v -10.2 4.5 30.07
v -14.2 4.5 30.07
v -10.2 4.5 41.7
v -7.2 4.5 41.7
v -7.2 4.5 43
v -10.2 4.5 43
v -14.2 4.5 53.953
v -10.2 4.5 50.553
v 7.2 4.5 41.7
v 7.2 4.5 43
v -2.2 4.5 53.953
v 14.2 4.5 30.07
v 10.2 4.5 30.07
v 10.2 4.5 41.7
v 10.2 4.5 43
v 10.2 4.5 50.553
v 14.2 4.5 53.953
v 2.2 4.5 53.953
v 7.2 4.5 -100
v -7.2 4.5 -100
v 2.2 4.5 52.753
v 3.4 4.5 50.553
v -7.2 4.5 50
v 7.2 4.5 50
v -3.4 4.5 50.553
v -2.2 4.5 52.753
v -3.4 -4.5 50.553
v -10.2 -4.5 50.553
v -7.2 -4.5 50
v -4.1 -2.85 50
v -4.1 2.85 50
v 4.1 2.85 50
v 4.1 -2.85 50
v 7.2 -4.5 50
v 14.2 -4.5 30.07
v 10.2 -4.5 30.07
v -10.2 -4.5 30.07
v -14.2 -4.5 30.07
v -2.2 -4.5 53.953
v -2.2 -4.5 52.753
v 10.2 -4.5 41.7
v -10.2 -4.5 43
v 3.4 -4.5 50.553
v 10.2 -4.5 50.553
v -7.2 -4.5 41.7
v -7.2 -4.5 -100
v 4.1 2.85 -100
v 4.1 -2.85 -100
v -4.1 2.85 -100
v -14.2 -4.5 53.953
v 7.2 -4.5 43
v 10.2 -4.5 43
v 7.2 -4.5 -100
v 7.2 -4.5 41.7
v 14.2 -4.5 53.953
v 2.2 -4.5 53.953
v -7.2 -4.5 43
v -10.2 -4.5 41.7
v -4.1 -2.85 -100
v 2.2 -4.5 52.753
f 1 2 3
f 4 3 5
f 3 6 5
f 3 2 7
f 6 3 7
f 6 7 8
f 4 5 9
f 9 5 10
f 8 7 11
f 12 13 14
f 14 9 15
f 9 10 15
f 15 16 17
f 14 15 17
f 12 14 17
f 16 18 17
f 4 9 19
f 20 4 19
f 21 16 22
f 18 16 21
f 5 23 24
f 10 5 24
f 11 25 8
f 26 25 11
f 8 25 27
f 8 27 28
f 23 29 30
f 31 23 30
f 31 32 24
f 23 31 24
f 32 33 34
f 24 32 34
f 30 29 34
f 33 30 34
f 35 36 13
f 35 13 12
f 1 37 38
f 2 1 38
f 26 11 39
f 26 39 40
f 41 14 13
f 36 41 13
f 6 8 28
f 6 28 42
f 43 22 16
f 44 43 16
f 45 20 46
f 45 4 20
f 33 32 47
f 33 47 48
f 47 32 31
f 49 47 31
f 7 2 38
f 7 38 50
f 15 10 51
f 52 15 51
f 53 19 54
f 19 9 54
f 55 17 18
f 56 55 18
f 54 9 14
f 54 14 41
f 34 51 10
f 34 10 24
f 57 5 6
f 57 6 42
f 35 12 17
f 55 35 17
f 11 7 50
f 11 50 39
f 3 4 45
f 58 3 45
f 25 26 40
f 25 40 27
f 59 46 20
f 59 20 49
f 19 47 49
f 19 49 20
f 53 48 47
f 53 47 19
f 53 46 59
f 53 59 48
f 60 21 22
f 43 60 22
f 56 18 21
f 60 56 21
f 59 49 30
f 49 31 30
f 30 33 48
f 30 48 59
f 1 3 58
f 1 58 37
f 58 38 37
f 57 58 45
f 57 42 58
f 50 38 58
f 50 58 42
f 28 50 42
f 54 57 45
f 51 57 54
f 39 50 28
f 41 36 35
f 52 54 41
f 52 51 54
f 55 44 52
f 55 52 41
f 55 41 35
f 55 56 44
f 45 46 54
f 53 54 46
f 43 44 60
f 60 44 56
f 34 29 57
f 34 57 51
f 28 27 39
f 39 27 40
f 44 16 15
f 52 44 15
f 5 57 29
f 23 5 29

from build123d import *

# Parameters (mm, degrees)
F0_W     = 14.4
F0_H     = 100
F1_DEPTH = 4.5
F2_W     = 8.2
F2_H     = 5.7
F3_DEPTH = 100.001
F4_W     = 9
F4_H     = 1.3
F5_DEPTH = 6
F7_DEPTH = 9
F9_DEPTH = 50


with BuildPart() as f1:
    # F0 (on Front) → F1 (new body, symmetric)
    with BuildSketch(Plane.XZ):
        Rectangle(F0_W, F0_H)
    extrude(amount=F1_DEPTH, both=True)

    # F2 (on face) → F3 (cut, through all)
    with BuildSketch(Plane.XY.offset(50)):
        Rectangle(F2_W, F2_H)
    extrude(amount=-F3_DEPTH, mode=Mode.SUBTRACT)

    # F4 (on face) → F5 (join)
    with BuildSketch(Plane(origin=(-7.2, 0, 0), x_dir=(0, -1, 0), z_dir=(-1, 0, 0))):
        with Locations((0, 42.35)):
            Rectangle(F4_W, F4_H)
    extrude(amount=F5_DEPTH)

    # F6 (on face) → F7 (join)
    with BuildSketch(Plane(origin=(0, 4.5, 0), x_dir=(-1, 0, 0), z_dir=(0, 1, 0))):
        Polygon((10.2, 50.5525747299), (10.2, 30.0701190412), (14.2, 30.0701190412), (14.2, 53.9525747299), (10.2, 53.9525747299), align=None)
        Polygon((3.4, 50.5525747299), (10.2, 50.5525747299), (10.2, 53.9525747299), (3.4, 53.9525747299), (2.2, 53.9525747299), (2.2, 52.7525747299), align=None)
    extrude(amount=-F7_DEPTH)

    # F8: F1 across plane


with BuildPart() as f1_1:
    add(f1.part)
    add(f1.part.mirror(Plane.YZ))

    # F9 (add): a face of the model
    f9_faces = [f1_1.faces().sort_by_distance(p)[0] for p in [
        (-7.0301883396, 0, -50),
    ]]
    extrude(f9_faces, amount=F9_DEPTH)


solid = f1_1.part
